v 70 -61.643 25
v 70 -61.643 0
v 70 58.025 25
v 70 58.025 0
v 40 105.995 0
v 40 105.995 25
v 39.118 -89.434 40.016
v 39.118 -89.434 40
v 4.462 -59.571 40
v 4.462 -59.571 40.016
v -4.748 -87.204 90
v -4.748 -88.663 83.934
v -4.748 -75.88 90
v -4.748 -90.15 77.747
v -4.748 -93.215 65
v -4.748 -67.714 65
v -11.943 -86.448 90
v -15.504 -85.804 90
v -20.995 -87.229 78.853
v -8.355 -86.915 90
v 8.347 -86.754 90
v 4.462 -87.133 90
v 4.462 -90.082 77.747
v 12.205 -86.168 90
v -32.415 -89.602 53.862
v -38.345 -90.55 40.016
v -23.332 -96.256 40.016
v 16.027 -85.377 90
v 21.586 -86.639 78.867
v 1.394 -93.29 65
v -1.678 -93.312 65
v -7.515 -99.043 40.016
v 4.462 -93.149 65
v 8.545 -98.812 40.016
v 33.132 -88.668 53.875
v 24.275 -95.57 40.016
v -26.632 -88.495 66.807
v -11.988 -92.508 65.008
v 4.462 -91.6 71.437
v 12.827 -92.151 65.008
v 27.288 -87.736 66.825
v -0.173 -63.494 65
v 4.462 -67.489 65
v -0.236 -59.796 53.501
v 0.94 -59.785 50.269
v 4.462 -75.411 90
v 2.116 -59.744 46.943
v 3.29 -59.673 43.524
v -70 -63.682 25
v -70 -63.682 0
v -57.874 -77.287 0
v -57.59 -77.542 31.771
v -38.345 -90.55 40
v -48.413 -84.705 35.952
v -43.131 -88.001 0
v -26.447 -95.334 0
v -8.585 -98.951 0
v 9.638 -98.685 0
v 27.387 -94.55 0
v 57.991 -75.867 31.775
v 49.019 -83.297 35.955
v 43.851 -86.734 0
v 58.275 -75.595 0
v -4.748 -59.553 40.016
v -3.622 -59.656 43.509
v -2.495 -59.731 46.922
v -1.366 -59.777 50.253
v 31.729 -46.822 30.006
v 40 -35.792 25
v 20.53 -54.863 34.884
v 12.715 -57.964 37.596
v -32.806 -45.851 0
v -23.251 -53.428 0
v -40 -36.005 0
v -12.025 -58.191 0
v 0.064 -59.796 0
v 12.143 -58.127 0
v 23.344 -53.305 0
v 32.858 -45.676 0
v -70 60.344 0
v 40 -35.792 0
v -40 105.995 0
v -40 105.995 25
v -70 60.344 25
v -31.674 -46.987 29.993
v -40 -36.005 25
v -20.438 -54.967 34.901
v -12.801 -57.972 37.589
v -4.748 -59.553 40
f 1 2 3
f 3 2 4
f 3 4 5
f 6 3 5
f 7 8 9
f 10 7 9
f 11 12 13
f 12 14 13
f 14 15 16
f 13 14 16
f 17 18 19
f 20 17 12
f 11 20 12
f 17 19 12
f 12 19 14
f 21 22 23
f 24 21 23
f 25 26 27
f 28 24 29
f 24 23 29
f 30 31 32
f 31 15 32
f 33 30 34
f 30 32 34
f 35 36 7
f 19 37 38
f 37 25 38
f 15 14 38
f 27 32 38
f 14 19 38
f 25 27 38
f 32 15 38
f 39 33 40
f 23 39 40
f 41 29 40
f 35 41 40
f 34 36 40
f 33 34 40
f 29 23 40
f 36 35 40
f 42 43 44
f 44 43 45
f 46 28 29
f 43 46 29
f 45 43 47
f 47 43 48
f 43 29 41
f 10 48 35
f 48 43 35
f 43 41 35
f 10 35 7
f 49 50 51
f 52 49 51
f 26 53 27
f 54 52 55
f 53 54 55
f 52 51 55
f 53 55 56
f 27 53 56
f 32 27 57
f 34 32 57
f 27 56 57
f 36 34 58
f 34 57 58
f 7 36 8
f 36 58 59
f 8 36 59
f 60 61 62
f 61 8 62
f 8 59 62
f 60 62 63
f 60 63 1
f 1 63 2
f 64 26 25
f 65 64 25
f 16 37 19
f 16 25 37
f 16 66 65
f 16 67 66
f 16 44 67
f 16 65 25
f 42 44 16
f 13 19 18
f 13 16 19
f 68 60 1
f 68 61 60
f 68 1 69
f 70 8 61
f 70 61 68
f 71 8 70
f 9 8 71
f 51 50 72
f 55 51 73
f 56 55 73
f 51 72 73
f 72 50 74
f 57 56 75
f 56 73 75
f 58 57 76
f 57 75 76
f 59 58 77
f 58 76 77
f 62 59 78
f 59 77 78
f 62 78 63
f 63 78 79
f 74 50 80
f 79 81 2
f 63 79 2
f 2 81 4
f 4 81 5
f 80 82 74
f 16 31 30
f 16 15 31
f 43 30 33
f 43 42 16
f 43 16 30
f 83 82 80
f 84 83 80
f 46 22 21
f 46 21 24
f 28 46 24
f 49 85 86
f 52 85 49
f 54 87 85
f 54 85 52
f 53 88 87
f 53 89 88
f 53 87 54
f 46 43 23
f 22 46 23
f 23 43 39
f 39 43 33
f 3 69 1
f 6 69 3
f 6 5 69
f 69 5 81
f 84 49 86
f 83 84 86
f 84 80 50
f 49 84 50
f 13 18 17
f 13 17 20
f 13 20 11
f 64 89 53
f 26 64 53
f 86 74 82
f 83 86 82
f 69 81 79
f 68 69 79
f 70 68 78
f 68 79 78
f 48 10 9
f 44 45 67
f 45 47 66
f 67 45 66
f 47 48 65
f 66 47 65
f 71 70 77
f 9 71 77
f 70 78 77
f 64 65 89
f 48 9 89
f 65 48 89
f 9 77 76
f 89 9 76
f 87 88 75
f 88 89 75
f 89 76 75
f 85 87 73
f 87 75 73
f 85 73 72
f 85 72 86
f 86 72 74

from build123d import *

# Parameters (mm, degrees)
F1_DEPTH    = 40
F2_DEPTH    = 25
F3_DEPTH    = 25
F4_SIZE2    = 41.212151
F4_SIZE     = 14.99999
F4_2_SIZE2  = 41.212151
F4_2_SIZE   = 14.99999
F5_DEPTH    = 25
F8_DEPTH    = 25
F9_T1_DEPTH = 305.3611948779
F9_T3_DEPTH = 305.3964050976
F9_T6_ANGLE = 198.1358920289
F9_T8_ANGLE = 199.0272584804


# Not quite as in the source:
# - a fillet or chamfer that OpenCascade refuses, or shapes differently, is made with other operations: its cross-section is extruded or revolved along the edge and cut away or added
# - a fillet or chamfer is up to 0.001 mm smaller than in the source, because OpenCascade refuses the exact size
# - ends of sketch curves that miss each other by under 0.0002 mm in the source are joined
# - a feature of the source that left no trace in its solid (it failed there, or was rolled back) is left out


with BuildPart() as f1:
    # F0 (on Top) → F1 (new body)
    with BuildSketch(Plane.XY):
        with BuildLine():
            Line((-40, -36.0045238119), (-70, -63.6819600925))
            ThreePointArc((-70, -63.6819600925), (0.5336536193, -99.3066602871), (70, -61.643119862))
            Line((70, -61.643119862), (40, -35.7918441296))
            ThreePointArc((40, -35.7918441296), (0.0635323292, -59.7960301521), (-40, -36.0045238119))
        make_face()
    extrude(amount=F1_DEPTH)

    # F0 (on Top) → F2 (join)
    with BuildSketch(Plane.XY):
        Polygon((-40, 105.9954761881), (-70, 60.3440771007), (-70, -63.6819600925), (-40, -36.0045238119), align=None)
    extrude(amount=F2_DEPTH)

    # F0 (on Top) → F3 (join)
    with BuildSketch(Plane.XY):
        Polygon((40, -35.7918441296), (70, -61.643119862), (70, 58.0248532689), (40, 105.9954761881), align=None)
    extrude(amount=F3_DEPTH)

    # F4 (size 15 and 41.2121612918 in the source; OpenCascade refuses exactly that, so slightly less here)
    f4_edges = [f1.edges().sort_by_distance(p)[0] for p in [
        (55, -48.717482, 40),
    ]]
    f4_side = f1.faces().sort_by_distance((55, -48.717482, 32.5))[0]
    chamfer(f4_edges, length=F4_SIZE, length2=F4_SIZE2, reference=f4_side)

    # F4#2 (size 15 and 41.2121612918 in the source; OpenCascade refuses exactly that, so slightly less here)
    f4_2_edges = [f1.edges().sort_by_distance(p)[0] for p in [
        (-55, -49.843242, 40),
    ]]
    f4_2_side = f1.faces().sort_by_distance((-55, -49.843242, 32.5))[0]
    chamfer(f4_2_edges, length=F4_2_SIZE, length2=F4_2_SIZE2, reference=f4_2_side)

    # F5 (add): a face of the model
    f5_faces = [f1.faces().sort_by_distance(p)[0] for p in [
        (0.2353529627, -82.8231732058, 40),
    ]]
    extrude(f5_faces, amount=F5_DEPTH)

    # F6 (on face) → F8 (join)
    with BuildSketch(Plane.XY.offset(65)):
        with BuildLine():
            Line((-4.7475561509, -99.219810589), (-4.7475561509, -59.5533930445))
            Line((-4.7475561509, -59.5533930445), (-38.3453534122, -90.5500754708))
            ThreePointArc((-38.3453534122, -90.5500754708), (-21.992530831, -96.6136201427), (-4.7475561509, -99.219810589))
        make_face()
        with BuildLine():
            Line((39.117860909, -89.4339641513), (4.4621424554, -59.5708130363))
            Line((4.4621424554, -59.5708130363), (4.4621283286, -99.1587323277))
            ThreePointArc((4.4621283286, -99.1587323277), (22.3094657758, -96.1475649652), (39.117860909, -89.4339641513))
        make_face()
    extrude(amount=F8_DEPTH)

    # F9: chamfer of 12 x 49.9835972411 on 4 edges, made by hand

    # F9_s2 → F9_t1 (cut)
    with BuildSketch(Plane(origin=(63.1741452332, 58.2832529798, 0), x_dir=(0, 0, 1), z_dir=(-0.73498516, -0.6780831915, 0))):
        Polygon((40.0164027589, -40.5516220902), (90, -52.5516220902), (90, -40.5516220902), align=None)
    extrude(amount=F9_T1_DEPTH, mode=Mode.SUBTRACT)

    # F9_s4 → F9_t3 (cut)
    with BuildSketch(Plane(origin=(165.0227982776, -142.2016620137, 0), x_dir=(0, 0, 1), z_dir=(-0.7575447308, 0.6527832572, 0))):
        Polygon((90, -54.2147436385), (40.0164027589, -42.2147436385), (90, -42.2147436385), align=None)
    extrude(amount=F9_T3_DEPTH, mode=Mode.SUBTRACT)

    # F9_s5 → F9_t6 (revolve, cut)
    with BuildSketch(Plane(origin=(-5.284270337, -12.1314567966, 0), x_dir=(0, 0, 1), z_dir=(0.3993440485, 0.9168011404, 0))):
        Polygon((90, -68.1975743243), (40.0164027589, -80.1975743243), (90, -80.1975743243), align=None)
    revolve(axis=Axis((-0.7068547451, -14.1253064914, 90), (0, 0, 1)), revolution_arc=F9_T6_ANGLE, mode=Mode.SUBTRACT)

    # F9_s7 → F9_t8 (revolve, cut)
    with BuildSketch(Plane(origin=(1.4990811594, -13.8871820878, 0), x_dir=(0, 0, 1), z_dir=(-0.1073236217, 0.9942241398, 0))):
        Polygon((40.0164027589, -87.4091372686), (90, -75.4091372686), (90, -87.4091372686), align=None)
    revolve(axis=Axis((-0.7068547451, -14.1253064914, 90), (0, 0, 1)), revolution_arc=F9_T8_ANGLE, mode=Mode.SUBTRACT)


solid = f1.part
